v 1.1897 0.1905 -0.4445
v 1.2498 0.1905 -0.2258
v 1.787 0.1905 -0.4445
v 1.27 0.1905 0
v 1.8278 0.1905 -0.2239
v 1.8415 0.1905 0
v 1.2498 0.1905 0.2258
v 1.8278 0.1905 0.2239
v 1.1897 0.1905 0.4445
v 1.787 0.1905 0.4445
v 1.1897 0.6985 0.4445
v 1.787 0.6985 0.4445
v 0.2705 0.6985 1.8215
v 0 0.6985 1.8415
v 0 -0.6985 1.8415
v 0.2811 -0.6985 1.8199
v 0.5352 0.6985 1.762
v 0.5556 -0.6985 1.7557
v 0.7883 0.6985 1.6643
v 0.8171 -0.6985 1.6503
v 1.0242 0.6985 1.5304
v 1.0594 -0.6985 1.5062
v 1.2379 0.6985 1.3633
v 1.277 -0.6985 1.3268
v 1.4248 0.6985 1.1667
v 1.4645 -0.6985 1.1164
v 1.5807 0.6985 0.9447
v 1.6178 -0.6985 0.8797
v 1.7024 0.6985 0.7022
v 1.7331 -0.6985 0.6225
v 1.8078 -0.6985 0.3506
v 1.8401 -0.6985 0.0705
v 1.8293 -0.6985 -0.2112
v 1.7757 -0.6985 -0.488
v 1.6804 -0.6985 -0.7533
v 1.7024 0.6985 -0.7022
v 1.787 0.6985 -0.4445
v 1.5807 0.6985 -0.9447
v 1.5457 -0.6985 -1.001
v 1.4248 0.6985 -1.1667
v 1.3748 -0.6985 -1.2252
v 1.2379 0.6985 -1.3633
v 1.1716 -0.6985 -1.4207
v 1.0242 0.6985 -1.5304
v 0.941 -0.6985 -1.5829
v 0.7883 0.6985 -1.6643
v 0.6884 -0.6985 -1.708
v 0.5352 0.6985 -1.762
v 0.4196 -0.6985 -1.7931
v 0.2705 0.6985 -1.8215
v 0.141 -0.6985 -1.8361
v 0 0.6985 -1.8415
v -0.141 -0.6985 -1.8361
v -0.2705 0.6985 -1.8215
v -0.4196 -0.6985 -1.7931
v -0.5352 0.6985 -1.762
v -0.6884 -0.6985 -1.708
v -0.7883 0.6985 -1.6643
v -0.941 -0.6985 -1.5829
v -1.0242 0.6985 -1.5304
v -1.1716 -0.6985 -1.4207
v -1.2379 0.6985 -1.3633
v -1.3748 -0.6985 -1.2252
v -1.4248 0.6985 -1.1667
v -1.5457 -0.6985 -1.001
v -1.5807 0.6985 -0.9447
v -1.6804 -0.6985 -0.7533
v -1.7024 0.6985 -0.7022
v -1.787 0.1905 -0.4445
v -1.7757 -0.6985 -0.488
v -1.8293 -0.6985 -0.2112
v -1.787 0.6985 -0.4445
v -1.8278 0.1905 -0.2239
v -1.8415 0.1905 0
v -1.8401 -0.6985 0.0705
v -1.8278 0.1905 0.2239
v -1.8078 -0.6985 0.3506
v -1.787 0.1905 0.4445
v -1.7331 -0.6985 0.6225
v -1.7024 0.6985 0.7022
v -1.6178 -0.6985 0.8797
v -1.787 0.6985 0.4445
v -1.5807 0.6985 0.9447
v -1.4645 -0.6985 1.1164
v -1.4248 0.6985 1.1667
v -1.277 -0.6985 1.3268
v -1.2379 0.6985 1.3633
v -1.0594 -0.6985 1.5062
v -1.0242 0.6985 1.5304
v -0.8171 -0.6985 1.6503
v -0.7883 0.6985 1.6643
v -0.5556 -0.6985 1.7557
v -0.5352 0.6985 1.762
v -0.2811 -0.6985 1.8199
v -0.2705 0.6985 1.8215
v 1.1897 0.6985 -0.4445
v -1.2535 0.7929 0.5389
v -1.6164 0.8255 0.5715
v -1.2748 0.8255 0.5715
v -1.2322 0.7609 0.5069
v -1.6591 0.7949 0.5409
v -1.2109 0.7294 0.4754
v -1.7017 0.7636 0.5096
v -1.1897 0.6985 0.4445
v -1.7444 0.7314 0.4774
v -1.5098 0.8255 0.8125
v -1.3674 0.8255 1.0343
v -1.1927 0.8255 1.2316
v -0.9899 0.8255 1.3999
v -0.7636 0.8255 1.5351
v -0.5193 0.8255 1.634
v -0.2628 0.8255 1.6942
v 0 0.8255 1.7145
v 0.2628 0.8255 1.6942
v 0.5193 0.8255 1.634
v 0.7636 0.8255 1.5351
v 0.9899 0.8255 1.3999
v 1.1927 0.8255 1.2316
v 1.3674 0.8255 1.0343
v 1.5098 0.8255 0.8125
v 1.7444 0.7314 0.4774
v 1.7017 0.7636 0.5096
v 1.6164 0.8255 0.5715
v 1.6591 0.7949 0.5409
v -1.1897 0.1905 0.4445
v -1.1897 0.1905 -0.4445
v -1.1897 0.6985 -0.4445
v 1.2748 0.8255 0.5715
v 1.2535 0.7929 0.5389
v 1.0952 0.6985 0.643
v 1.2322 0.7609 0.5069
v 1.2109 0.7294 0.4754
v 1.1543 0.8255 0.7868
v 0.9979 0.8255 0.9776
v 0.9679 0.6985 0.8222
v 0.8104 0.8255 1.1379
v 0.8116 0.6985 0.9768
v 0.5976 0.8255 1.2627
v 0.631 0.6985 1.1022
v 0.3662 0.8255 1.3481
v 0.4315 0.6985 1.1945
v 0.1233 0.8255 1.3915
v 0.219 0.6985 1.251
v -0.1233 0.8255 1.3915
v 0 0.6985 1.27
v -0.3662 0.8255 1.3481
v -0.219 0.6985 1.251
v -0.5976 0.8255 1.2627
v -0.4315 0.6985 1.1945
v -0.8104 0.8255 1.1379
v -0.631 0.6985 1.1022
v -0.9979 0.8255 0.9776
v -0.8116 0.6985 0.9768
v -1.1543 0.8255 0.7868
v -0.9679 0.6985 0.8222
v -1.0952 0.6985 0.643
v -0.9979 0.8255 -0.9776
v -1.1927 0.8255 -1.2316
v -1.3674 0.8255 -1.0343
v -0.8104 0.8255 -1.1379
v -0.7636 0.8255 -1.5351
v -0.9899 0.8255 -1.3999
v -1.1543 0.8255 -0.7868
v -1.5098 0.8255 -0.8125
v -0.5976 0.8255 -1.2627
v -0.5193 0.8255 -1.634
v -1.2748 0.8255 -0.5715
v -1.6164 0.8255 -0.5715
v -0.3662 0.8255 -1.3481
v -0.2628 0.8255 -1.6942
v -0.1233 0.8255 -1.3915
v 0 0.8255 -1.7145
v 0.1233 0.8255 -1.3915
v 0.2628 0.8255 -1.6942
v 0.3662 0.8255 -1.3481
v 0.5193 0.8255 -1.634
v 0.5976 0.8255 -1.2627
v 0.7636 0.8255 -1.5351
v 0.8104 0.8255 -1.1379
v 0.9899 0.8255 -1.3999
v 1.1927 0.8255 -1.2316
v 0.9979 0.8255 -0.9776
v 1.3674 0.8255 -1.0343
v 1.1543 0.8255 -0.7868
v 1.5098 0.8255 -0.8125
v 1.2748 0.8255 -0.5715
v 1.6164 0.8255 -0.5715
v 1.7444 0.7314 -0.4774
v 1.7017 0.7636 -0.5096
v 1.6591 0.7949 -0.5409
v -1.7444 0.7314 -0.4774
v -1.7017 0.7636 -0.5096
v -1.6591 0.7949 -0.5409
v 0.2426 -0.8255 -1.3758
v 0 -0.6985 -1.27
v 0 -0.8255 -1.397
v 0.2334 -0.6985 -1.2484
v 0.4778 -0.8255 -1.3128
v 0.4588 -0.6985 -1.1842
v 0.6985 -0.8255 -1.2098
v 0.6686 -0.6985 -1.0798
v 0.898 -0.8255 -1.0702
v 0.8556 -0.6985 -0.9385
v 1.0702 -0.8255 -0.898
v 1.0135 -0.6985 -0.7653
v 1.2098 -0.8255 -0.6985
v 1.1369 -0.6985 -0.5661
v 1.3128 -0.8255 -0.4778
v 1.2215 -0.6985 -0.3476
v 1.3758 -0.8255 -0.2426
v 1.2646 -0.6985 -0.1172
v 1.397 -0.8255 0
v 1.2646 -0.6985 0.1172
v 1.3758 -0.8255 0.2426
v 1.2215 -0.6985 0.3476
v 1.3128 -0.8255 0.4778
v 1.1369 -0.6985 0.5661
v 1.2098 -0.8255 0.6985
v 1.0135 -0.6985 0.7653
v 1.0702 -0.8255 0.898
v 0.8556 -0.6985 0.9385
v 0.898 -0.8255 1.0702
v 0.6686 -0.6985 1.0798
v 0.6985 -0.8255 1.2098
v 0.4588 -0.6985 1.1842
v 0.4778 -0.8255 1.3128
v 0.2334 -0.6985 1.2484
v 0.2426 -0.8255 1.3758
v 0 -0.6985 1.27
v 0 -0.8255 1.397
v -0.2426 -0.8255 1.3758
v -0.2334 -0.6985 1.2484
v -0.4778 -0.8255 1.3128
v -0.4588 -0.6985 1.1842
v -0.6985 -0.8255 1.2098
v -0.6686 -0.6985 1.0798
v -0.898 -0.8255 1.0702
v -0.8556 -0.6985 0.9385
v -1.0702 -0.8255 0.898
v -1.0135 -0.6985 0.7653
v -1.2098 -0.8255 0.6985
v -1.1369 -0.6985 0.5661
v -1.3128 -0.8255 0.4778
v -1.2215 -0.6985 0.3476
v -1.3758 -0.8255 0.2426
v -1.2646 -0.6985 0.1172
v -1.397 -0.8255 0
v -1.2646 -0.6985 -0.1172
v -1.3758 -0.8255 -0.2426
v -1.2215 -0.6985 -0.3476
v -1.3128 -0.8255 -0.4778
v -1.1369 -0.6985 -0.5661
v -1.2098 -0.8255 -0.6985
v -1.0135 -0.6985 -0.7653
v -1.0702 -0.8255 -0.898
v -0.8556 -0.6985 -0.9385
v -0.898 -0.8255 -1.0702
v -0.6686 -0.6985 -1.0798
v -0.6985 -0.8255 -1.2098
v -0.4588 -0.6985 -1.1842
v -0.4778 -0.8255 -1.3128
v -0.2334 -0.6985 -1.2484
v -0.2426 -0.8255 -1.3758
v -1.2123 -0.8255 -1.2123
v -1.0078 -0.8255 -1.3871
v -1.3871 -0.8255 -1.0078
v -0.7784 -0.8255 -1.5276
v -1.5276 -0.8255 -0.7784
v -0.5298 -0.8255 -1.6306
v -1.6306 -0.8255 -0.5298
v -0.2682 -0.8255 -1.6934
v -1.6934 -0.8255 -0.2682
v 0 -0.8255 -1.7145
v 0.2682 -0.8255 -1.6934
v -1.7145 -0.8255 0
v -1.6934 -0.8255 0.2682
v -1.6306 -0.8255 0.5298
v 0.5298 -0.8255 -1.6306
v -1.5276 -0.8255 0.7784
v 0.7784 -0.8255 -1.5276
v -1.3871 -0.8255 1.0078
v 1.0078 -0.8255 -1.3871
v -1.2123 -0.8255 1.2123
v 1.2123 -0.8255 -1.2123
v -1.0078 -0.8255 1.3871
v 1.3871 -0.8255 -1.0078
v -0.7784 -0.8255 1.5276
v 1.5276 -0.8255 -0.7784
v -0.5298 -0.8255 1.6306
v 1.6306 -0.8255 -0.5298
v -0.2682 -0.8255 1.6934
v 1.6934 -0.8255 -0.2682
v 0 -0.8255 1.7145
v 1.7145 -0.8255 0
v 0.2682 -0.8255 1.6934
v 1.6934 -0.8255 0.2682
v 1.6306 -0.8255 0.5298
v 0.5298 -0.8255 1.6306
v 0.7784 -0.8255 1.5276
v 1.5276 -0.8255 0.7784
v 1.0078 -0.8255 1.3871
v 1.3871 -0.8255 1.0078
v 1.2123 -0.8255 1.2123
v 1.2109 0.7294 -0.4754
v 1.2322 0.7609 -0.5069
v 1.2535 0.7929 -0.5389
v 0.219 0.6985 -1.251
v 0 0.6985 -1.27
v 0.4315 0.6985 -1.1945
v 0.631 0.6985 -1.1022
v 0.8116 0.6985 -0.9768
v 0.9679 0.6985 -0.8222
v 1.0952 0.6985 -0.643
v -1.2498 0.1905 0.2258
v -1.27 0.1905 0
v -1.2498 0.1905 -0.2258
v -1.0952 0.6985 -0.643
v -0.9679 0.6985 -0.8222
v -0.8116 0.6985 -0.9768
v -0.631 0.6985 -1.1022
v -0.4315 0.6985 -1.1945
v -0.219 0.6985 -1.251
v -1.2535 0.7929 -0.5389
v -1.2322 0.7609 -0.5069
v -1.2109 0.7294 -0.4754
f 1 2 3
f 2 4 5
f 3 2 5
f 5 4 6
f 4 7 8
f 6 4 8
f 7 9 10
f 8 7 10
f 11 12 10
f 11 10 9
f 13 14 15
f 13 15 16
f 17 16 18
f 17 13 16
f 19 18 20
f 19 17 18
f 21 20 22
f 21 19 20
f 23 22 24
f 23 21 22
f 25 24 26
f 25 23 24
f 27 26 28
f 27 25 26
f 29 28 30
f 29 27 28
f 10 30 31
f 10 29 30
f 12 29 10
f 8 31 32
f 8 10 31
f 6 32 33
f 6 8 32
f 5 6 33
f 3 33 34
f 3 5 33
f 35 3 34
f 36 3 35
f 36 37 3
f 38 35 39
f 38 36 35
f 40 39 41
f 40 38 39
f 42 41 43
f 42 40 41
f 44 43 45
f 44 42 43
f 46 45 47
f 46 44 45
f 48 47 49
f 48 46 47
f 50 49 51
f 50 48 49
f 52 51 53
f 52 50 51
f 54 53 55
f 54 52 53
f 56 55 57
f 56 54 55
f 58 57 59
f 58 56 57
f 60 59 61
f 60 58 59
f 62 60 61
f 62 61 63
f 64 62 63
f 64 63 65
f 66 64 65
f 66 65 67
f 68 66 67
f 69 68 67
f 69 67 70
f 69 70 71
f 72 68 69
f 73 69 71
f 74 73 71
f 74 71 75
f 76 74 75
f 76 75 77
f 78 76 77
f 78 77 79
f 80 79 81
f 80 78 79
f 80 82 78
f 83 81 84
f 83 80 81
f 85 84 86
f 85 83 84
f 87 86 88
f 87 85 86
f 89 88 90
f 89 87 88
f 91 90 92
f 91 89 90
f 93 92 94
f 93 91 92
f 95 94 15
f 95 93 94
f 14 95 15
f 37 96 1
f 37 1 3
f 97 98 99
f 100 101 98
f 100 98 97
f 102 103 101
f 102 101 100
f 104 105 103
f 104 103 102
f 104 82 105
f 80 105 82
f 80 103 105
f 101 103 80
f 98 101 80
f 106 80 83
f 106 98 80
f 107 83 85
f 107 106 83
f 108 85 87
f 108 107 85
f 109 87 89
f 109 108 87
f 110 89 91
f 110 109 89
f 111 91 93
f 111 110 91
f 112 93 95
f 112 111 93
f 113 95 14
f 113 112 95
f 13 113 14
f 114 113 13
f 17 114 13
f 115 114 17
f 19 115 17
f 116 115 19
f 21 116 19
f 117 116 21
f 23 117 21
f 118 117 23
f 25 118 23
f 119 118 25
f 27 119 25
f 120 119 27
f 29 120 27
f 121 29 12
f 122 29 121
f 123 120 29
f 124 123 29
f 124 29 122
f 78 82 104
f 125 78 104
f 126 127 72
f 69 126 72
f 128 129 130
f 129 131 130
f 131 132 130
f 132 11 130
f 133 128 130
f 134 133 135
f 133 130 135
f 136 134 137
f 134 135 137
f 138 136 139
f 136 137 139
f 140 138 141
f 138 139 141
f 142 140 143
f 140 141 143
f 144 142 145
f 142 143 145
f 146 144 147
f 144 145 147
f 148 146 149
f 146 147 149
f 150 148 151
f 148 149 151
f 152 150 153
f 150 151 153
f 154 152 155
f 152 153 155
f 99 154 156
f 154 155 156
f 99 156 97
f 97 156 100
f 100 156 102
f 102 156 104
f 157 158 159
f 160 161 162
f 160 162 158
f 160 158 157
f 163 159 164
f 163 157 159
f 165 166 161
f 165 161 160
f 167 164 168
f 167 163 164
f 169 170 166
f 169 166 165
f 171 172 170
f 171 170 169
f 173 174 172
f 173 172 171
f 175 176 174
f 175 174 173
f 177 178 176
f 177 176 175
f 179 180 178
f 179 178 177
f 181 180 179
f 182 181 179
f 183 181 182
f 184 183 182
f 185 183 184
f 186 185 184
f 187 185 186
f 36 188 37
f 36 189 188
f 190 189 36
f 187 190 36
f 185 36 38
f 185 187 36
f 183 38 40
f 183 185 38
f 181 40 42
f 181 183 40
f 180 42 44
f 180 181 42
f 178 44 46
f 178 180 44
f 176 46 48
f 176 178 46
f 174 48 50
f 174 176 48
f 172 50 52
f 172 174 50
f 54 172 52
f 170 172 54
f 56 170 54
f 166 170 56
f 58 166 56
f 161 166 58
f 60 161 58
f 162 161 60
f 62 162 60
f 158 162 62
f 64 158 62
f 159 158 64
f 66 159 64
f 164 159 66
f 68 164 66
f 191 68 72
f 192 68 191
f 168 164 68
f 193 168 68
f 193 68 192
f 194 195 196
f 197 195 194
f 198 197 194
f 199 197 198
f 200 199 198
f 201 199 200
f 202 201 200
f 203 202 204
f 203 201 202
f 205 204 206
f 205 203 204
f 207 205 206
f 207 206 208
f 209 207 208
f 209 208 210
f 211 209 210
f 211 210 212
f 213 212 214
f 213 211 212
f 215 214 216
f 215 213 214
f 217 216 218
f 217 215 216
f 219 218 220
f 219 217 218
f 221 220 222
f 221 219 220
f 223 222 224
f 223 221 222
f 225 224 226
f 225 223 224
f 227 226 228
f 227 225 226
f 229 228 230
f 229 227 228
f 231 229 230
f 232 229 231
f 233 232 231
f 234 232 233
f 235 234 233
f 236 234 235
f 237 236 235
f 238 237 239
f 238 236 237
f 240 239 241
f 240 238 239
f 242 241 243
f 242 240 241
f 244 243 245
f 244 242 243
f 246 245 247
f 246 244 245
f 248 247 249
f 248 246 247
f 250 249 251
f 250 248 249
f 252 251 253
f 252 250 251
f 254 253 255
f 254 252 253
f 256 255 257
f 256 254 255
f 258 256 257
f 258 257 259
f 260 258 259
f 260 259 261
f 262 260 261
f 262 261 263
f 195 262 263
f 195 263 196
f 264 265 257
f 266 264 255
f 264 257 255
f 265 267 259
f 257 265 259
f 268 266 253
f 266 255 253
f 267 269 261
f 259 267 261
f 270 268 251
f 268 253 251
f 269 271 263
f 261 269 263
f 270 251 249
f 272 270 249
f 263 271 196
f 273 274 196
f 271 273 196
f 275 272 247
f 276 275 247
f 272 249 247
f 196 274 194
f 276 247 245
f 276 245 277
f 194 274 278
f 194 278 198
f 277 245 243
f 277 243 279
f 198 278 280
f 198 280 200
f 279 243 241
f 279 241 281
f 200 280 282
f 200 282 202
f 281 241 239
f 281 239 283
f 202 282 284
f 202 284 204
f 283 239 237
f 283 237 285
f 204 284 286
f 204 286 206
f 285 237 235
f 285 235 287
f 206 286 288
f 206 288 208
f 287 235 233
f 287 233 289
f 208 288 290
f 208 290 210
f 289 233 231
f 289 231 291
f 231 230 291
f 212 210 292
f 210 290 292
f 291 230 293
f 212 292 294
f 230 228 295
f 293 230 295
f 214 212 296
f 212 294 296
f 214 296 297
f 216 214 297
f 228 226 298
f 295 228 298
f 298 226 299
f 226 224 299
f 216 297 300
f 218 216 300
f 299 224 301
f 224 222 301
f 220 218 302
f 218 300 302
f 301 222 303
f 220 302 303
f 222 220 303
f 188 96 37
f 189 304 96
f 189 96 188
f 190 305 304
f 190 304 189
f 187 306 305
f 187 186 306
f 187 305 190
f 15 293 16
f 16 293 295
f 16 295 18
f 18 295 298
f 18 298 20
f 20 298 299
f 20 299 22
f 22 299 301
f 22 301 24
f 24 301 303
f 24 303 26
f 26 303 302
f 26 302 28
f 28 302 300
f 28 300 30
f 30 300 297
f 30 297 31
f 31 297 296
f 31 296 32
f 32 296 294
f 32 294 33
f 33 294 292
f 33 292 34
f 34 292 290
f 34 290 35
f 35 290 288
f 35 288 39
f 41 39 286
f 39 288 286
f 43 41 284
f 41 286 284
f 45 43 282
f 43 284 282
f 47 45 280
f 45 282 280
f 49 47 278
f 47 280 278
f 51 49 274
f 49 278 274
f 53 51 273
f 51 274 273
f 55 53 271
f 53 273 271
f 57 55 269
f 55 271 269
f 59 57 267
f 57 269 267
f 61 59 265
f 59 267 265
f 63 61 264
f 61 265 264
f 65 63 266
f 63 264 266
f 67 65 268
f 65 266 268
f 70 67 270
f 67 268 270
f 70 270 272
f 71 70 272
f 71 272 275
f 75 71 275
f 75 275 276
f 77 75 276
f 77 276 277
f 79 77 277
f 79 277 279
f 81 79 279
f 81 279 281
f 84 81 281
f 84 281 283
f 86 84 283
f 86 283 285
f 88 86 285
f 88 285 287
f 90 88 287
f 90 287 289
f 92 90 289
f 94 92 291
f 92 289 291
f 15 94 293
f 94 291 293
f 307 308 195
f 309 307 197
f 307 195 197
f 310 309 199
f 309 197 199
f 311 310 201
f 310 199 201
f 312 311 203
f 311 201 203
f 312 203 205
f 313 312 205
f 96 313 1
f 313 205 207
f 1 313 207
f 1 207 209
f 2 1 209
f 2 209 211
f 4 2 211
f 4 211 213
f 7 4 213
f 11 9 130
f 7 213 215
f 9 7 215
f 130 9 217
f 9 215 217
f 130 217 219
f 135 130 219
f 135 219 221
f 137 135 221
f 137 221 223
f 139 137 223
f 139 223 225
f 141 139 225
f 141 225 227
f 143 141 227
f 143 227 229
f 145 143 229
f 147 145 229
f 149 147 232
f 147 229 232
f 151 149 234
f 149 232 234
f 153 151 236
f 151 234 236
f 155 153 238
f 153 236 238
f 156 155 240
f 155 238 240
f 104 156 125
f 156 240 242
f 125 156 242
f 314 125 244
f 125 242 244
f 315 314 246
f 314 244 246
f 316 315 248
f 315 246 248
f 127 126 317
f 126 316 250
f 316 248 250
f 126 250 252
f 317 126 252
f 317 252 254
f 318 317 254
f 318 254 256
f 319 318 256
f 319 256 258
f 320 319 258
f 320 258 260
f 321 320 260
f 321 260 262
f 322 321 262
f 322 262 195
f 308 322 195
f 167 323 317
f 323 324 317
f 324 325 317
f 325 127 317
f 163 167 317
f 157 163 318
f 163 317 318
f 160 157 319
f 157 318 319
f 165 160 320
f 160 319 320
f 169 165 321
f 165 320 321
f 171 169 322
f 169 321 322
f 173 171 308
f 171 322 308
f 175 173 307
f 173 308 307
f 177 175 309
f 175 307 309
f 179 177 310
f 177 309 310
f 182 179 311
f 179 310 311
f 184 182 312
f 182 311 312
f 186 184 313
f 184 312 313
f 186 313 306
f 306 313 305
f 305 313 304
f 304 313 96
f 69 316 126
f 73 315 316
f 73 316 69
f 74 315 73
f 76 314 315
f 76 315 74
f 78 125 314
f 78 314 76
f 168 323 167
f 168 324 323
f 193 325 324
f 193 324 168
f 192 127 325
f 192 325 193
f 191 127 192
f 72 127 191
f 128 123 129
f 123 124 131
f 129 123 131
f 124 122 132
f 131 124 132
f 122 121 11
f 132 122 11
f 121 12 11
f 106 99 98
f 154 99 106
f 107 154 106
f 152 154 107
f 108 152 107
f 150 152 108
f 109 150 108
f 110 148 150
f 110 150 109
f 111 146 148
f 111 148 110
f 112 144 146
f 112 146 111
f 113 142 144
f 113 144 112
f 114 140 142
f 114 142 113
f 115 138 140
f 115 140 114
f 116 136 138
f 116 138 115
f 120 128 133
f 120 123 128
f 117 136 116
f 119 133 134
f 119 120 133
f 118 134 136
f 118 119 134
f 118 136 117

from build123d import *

# Parameters (mm, degrees)
SKETCH1_R           = 1.8415
BOSS_EXTRUDE1_DEPTH = 0.8255
SKETCH3_R           = 1.27
CUT_EXTRUDE2_DEPTH  = 2.651
CUT_EXTRUDE6_DEPTH  = 0.635
CHAMFER1_SIZE       = 0.127


with BuildPart() as part:
    # Sketch1 → Boss-Extrude1 (new body, symmetric)
    with BuildSketch(Plane(origin=(0, 0, 0), x_dir=(1, 0, 0), z_dir=(0, 1, 0))):
        with Locations(Location((0, 0, 0), (0, 0, 270))):  # turned: the seam where the file's is
            Circle(SKETCH1_R)
    extrude(amount=BOSS_EXTRUDE1_DEPTH, both=True)

    # Sketch3 → Cut-Extrude2 (cut, through all)
    with BuildSketch(Plane.XZ.offset(0.8255)):
        with Locations(Location((0, 0, 0), (0, 0, 270))):  # turned: the seam where the file's is
            Circle(SKETCH3_R)
    extrude(amount=-CUT_EXTRUDE2_DEPTH, mode=Mode.SUBTRACT)

    # Sketch7 → Cut-Extrude6 (cut)
    with BuildSketch(Plane.XZ.offset(-0.8255)):
        with BuildLine():
            Line((1.189672119, -0.4445), (1.787048404, -0.4445))
            ThreePointArc((1.787048404, -0.4445), (1.8415, 0), (1.787048404, 0.4445))
            Line((1.787048404, 0.4445), (1.189672119, 0.4445))
            ThreePointArc((1.189672119, 0.4445), (1.27, 0), (1.189672119, -0.4445))
        make_face()
        with BuildLine():
            Line((-1.787048404, 0.4445), (-1.189672119, 0.4445))
            ThreePointArc((-1.189672119, 0.4445), (-1.27, 0), (-1.189672119, -0.4445))
            Line((-1.189672119, -0.4445), (-1.787048404, -0.4445))
            ThreePointArc((-1.787048404, -0.4445), (-1.8415, 0), (-1.787048404, 0.4445))
        make_face()
    extrude(amount=CUT_EXTRUDE6_DEPTH, mode=Mode.SUBTRACT)

    # Chamfer1
    chamfer1_edges = [part.edges().sort_by_distance(p)[0] for p in [
        (0, 0.8255, 1.27),
        (0, 0.8255, -1.8415),
        (1.488360262, 0.8255, 0.4445),
        (1.488360262, 0.8255, -0.4445),
        (0, -0.8255, -1.8415),
        (0.724011395, 0.8255, -1.043411472),
        (1.134146265, 0.8255, 1.450804777),
        (-1.488360262, 0.8255, 0.4445),
        (-1.488360262, 0.8255, -0.4445),
        (0, -0.8255, 1.27),
    ]]
    chamfer(chamfer1_edges, length=CHAMFER1_SIZE)


solid = part.part
